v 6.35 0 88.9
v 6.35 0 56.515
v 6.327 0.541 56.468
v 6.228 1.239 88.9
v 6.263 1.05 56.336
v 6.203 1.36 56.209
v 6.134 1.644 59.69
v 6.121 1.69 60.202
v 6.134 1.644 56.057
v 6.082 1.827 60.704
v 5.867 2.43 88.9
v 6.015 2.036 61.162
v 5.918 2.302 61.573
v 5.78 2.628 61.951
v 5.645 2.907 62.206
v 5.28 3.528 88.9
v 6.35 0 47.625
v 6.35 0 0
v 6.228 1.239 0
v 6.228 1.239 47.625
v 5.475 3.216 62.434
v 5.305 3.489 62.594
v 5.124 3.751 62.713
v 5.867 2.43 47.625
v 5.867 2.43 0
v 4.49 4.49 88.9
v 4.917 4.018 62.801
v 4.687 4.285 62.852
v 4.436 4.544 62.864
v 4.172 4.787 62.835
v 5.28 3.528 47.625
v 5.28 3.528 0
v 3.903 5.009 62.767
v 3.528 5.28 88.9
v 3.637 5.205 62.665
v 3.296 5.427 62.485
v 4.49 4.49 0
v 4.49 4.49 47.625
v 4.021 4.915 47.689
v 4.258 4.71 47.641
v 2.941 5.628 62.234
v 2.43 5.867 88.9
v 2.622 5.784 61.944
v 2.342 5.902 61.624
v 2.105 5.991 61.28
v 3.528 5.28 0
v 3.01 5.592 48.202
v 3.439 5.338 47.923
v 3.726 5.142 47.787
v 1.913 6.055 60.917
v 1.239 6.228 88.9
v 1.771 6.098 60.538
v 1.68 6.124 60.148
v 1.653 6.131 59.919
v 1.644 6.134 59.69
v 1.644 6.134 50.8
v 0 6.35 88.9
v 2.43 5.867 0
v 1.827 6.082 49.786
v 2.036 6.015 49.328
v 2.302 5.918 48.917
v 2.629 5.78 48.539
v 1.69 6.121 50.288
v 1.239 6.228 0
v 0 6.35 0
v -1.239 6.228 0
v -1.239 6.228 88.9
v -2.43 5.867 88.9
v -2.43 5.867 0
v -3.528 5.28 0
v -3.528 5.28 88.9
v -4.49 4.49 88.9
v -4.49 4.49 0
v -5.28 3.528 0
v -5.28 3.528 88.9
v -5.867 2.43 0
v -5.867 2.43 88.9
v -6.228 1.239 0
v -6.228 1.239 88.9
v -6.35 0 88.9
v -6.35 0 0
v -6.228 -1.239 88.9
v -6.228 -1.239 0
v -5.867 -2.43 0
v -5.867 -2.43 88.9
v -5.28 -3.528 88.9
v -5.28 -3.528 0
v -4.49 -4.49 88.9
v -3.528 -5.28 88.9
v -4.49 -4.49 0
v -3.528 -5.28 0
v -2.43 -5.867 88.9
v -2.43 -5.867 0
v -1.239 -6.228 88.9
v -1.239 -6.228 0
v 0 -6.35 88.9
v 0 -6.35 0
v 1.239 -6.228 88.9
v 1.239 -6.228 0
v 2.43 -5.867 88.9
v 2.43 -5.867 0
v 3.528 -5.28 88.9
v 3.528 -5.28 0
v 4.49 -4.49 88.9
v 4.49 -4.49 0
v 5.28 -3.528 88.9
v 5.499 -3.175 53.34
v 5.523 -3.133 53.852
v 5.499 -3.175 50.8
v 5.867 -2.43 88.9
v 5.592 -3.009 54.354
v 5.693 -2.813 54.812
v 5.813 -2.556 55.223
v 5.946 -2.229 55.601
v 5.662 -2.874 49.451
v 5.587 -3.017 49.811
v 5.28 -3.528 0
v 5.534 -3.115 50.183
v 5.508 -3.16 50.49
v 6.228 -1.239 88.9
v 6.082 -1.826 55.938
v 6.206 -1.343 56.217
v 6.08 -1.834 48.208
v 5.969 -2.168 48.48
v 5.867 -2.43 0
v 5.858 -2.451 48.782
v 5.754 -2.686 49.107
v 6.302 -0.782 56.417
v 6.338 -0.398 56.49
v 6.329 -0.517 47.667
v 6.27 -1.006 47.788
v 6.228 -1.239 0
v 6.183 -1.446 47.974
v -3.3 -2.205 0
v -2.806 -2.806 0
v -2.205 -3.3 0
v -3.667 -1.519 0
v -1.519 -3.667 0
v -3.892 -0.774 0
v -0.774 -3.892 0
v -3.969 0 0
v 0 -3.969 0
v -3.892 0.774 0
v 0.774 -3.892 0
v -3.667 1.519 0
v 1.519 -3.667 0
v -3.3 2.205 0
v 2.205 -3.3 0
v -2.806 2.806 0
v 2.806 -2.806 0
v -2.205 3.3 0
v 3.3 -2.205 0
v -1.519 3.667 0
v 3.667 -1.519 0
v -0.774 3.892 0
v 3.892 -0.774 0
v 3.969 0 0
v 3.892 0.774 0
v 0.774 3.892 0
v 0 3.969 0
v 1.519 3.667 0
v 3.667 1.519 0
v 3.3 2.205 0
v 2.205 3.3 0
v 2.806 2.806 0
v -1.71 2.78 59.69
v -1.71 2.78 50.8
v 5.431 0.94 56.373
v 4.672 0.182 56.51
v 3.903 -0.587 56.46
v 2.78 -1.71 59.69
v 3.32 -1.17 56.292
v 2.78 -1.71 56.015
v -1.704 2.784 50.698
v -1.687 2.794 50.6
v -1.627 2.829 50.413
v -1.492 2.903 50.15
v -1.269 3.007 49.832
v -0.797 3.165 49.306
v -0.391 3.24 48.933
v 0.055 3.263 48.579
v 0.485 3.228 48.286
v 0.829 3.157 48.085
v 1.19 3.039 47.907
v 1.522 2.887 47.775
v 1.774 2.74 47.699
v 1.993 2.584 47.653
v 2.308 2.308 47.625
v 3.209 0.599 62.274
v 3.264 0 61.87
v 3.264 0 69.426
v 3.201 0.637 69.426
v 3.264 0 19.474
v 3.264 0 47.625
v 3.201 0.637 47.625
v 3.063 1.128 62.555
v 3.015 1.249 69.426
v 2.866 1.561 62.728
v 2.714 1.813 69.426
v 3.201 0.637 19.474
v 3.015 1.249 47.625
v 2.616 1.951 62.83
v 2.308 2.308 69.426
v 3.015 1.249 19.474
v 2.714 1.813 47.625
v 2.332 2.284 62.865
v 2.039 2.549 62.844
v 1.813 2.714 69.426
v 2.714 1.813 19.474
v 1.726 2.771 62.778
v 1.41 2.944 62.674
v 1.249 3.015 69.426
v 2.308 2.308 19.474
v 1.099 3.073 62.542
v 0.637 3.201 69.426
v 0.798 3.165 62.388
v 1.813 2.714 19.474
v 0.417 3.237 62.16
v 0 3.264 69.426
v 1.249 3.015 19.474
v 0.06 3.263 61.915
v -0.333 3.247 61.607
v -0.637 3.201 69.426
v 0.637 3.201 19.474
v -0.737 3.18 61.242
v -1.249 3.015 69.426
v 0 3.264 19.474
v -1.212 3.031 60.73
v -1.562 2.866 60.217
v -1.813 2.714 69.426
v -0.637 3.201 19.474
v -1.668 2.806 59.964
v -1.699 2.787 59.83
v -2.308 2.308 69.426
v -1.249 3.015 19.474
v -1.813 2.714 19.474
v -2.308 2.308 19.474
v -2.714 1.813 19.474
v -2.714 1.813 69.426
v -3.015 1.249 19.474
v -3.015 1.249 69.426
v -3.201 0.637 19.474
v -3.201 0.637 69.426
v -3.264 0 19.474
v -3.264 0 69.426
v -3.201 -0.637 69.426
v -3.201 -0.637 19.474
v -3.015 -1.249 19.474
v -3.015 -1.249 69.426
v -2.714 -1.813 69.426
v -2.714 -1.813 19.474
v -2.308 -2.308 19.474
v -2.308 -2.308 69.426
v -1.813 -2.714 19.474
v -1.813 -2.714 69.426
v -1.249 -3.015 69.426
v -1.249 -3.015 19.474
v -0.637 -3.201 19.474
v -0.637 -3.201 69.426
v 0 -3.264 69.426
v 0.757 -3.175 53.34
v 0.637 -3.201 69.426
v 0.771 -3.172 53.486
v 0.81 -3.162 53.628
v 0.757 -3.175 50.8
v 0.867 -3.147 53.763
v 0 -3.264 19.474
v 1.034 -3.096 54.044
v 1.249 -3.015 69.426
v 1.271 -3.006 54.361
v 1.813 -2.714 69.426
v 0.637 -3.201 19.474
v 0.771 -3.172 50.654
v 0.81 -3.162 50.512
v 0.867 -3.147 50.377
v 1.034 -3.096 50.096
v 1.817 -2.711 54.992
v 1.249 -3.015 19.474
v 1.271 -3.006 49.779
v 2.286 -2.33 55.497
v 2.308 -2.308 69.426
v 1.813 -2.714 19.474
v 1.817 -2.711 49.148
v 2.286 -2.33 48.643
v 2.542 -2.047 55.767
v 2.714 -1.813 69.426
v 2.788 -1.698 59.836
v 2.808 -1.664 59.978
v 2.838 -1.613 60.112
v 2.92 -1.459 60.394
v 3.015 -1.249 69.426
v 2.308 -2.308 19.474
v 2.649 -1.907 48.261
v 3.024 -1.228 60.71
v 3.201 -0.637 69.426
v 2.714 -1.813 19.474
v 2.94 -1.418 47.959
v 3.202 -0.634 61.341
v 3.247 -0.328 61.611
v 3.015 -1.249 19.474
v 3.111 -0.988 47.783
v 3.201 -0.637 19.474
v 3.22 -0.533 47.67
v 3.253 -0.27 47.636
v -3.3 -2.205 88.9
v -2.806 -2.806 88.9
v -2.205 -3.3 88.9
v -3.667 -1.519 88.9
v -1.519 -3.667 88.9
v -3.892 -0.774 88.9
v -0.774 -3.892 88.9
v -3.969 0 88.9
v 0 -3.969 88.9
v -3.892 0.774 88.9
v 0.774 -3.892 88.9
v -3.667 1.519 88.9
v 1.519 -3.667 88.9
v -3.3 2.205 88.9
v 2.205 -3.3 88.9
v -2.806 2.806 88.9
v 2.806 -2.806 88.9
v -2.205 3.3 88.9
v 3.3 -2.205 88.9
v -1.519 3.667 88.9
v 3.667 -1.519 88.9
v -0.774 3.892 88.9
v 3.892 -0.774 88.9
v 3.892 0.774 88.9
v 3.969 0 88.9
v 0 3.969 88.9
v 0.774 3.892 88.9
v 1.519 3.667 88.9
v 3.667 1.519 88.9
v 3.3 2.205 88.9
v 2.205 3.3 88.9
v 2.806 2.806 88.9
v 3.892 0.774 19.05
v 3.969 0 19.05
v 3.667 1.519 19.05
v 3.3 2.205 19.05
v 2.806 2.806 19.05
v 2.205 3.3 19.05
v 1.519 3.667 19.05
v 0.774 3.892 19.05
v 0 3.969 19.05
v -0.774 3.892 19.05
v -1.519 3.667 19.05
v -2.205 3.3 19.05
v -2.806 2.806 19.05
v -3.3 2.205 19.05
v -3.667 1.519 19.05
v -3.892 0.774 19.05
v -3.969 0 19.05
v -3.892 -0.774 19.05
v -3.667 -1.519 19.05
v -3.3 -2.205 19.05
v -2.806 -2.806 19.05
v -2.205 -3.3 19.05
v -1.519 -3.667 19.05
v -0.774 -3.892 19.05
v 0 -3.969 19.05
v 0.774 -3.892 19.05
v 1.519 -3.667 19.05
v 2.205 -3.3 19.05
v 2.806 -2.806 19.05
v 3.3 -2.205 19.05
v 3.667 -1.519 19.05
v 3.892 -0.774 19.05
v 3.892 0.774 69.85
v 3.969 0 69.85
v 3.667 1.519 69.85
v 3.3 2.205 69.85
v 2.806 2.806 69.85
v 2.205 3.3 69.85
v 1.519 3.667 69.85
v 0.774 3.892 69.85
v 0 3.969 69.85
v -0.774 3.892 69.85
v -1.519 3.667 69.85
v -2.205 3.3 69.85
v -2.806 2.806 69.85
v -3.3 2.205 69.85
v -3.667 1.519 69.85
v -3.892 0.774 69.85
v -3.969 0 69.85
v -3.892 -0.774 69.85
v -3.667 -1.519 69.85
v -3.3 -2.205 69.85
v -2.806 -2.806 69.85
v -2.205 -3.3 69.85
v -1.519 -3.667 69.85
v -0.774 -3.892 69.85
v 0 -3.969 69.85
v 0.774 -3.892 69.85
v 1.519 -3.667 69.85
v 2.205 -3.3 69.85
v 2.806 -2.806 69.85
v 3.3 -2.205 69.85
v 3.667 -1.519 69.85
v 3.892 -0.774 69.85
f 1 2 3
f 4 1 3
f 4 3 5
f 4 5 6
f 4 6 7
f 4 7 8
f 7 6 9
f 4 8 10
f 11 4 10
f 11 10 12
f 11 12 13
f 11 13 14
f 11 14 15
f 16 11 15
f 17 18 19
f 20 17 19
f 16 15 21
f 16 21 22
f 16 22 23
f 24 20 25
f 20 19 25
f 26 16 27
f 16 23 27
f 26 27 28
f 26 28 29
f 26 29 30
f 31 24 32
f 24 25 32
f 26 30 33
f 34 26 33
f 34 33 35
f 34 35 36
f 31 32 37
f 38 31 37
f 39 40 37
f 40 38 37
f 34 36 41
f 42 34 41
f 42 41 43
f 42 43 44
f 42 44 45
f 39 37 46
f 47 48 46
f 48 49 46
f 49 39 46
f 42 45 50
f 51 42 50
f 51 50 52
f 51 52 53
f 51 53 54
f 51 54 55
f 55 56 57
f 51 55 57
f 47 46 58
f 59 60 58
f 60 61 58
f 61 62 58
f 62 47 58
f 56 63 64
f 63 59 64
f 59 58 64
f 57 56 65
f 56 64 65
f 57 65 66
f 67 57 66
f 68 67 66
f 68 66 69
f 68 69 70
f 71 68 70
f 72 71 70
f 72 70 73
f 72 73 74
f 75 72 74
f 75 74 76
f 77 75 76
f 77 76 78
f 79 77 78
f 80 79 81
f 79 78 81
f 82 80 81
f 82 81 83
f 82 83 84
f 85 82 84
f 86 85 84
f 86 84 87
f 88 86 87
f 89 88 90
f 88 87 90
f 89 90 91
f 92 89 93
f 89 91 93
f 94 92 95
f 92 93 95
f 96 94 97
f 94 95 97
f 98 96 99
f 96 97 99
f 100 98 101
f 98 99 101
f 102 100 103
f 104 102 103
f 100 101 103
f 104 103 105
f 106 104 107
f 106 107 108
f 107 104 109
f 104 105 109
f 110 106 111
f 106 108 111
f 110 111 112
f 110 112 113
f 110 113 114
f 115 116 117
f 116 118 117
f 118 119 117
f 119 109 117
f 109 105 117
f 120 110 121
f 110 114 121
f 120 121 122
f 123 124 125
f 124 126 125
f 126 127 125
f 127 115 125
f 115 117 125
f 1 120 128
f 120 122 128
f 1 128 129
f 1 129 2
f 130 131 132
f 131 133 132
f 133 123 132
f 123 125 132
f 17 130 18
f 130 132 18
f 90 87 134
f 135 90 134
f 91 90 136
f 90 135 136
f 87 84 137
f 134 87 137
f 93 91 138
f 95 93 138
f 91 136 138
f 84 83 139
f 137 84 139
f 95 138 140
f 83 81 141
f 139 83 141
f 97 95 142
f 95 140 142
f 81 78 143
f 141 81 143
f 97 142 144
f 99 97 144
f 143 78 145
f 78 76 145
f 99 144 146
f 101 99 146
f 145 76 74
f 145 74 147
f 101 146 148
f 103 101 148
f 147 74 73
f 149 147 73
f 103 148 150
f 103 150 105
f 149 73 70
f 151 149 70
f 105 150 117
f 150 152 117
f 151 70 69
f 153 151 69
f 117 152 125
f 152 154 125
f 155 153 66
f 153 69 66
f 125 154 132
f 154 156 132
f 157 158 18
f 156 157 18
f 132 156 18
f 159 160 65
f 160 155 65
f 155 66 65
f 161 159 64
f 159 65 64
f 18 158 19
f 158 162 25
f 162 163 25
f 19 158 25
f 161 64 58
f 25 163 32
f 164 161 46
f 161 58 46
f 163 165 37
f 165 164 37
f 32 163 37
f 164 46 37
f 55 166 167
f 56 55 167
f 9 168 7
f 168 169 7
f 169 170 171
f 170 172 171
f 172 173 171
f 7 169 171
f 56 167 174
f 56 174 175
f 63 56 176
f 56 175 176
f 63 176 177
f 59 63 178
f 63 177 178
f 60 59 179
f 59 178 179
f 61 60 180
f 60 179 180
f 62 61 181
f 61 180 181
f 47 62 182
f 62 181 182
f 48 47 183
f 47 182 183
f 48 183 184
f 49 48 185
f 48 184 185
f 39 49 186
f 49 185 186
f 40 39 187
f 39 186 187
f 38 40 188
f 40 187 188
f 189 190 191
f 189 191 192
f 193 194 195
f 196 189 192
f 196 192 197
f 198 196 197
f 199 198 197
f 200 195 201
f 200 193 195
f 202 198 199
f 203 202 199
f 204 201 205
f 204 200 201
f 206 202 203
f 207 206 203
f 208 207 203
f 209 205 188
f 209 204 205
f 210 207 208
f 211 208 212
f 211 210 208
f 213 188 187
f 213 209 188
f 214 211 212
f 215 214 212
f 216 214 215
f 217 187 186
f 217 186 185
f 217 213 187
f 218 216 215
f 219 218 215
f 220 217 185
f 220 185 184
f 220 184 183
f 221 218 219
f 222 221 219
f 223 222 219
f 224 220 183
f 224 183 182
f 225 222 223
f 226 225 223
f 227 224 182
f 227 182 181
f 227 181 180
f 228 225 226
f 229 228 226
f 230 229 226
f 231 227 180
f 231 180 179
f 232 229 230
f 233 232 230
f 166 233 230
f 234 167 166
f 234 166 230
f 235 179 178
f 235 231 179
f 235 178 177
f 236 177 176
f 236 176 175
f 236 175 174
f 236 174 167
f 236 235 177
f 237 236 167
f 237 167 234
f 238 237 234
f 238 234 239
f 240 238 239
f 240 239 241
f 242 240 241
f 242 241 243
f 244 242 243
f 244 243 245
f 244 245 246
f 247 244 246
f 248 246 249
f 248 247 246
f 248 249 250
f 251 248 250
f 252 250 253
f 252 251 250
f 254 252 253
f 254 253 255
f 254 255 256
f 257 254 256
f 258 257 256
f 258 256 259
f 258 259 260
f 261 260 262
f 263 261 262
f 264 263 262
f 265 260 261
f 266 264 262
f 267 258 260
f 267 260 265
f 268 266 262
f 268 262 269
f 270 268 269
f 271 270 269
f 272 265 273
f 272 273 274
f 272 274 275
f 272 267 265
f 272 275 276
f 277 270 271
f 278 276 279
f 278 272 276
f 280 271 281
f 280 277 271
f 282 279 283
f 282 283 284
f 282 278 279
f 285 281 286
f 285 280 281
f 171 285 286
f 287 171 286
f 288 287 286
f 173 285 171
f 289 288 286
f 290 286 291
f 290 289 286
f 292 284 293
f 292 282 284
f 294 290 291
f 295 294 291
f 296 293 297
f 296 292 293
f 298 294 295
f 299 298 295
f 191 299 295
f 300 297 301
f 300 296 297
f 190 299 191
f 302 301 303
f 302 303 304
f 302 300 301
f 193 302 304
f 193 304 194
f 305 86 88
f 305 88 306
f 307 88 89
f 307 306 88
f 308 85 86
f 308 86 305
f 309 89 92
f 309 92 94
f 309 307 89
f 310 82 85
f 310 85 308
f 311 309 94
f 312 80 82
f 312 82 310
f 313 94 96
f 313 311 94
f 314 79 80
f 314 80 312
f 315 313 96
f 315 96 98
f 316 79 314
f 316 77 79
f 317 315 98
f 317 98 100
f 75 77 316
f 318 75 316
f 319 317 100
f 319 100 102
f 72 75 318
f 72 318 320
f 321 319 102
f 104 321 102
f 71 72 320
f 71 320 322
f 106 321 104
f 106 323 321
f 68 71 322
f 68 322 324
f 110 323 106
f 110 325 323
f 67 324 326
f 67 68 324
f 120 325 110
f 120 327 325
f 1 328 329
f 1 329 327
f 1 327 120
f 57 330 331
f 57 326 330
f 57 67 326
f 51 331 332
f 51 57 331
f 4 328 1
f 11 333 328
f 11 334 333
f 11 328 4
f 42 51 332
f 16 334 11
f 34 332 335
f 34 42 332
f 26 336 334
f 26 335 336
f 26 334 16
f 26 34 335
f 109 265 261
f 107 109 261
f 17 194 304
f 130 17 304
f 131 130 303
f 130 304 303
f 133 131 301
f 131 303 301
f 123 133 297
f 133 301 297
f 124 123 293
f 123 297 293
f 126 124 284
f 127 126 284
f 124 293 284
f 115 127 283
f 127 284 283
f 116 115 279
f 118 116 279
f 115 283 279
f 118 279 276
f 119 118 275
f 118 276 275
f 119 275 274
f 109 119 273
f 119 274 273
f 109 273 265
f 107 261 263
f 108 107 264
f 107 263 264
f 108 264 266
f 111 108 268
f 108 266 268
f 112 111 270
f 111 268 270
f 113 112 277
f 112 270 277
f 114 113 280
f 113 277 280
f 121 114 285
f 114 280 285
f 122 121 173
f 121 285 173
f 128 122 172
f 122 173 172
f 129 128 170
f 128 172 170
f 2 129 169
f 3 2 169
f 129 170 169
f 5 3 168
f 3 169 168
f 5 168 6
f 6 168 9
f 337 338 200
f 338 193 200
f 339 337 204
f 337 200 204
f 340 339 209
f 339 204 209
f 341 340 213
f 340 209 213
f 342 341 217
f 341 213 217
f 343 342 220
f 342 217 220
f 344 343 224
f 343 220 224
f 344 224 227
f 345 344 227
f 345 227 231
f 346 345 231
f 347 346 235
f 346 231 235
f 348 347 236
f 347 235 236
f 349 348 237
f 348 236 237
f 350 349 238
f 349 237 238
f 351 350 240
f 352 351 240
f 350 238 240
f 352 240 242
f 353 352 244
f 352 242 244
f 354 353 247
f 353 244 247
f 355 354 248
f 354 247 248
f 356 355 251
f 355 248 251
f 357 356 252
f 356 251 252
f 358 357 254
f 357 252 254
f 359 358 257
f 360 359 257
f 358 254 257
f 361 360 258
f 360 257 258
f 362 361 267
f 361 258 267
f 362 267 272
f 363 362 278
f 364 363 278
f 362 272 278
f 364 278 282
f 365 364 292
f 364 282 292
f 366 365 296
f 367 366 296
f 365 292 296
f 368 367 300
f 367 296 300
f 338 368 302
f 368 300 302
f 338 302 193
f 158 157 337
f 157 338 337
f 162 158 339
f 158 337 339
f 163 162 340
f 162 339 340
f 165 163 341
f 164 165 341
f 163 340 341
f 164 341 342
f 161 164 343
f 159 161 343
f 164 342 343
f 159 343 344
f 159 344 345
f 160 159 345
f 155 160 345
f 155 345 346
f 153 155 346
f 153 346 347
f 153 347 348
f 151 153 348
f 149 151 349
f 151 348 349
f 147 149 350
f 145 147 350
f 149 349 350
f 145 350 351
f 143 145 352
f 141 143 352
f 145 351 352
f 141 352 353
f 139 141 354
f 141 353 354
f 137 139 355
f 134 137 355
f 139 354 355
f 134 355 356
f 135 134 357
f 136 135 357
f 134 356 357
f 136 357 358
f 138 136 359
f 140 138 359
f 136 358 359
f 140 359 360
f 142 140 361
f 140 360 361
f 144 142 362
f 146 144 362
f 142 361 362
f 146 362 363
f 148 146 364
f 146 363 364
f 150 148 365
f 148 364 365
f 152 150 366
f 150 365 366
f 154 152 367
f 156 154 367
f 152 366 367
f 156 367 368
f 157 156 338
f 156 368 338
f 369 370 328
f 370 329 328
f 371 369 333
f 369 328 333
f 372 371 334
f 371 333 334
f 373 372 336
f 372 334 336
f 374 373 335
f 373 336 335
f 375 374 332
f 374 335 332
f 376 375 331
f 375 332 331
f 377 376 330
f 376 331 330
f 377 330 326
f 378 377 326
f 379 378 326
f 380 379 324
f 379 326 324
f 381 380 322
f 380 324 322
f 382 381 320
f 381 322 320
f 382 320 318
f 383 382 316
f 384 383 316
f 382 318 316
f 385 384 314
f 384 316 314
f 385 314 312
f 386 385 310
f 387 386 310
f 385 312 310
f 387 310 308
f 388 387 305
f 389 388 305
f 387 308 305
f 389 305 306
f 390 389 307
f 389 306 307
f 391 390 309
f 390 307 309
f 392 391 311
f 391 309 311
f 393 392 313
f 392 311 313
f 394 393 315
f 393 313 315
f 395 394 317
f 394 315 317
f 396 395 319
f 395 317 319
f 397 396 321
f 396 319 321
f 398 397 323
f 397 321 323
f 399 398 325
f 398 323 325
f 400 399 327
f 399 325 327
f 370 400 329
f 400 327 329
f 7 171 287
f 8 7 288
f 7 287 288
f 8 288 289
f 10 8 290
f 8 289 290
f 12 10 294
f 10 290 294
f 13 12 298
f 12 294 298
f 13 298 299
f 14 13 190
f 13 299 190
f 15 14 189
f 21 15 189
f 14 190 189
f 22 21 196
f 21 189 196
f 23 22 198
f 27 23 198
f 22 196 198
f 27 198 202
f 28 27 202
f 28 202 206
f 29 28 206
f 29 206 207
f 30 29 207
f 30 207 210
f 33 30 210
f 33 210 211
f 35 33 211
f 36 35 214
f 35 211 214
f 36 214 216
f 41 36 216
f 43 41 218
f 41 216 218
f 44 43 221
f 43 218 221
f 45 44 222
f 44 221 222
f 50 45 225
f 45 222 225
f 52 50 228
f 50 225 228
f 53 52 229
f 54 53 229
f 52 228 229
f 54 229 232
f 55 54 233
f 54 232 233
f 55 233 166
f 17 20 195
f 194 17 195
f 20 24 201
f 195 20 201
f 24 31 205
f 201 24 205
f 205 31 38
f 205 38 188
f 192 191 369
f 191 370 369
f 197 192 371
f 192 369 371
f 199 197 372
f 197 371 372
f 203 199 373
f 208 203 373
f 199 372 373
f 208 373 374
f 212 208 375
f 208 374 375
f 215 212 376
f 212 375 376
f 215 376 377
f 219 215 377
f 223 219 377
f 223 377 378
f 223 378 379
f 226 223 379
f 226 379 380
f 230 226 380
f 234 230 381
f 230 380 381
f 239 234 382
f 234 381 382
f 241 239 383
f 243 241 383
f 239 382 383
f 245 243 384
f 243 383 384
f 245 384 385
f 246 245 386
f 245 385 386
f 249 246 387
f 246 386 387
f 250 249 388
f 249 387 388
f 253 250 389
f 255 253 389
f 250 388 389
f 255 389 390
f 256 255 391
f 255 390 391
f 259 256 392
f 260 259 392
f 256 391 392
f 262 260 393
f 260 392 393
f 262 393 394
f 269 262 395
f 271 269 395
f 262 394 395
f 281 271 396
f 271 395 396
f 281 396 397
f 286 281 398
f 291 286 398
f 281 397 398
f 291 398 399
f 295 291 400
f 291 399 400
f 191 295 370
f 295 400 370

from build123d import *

# Parameters (mm, degrees)
SKETCH1_R           = 6.35
SKETCH1_R_2         = 3.2639
BOSS_EXTRUDE1_DEPTH = 88.9
CUT_EXTRUDE2_DEPTH  = 90.352420225
CUT_EXTRUDE3_DEPTH  = 90.352420338
SKETCH75_W          = 6.35
SKETCH75_H          = 6.35
CUT_REVOLVE1_ANGLE  = 45


# Read off the part's stored shape, not the designer's step: 3/8-16 Tapped Hole3
with BuildPart() as part:
    # Sketch1 → Boss-Extrude1 (new body)
    with BuildSketch(Plane.XY):
        Circle(SKETCH1_R)
        Circle(SKETCH1_R_2, mode=Mode.SUBTRACT)
    extrude(amount=BOSS_EXTRUDE1_DEPTH)

    # 3/8-16 Tapped Hole3 outline → 3/8-16 Tapped Hole3 (revolve, cut)
    with BuildSketch(Plane.XZ):
        Polygon((3.2639, 88.9), (3.2639, 69.426483393), (3.96875, 69.85), (3.96875, 88.9), align=None)
        Polygon((3.96875, 19.05), (3.2639, 19.473516607), (3.2639, 0), (3.96875, 0), align=None)
    revolve(axis=Axis((0, 0, 0), (0, 0, 1)), mode=Mode.SUBTRACT)

    # Sketch13 → Cut-Extrude2 (cut, through all)
    with BuildSketch(Plane(origin=(0, 0, 0), x_dir=(0, 0, -1), z_dir=(1, 0, 0))):
        with BuildLine():
            Line((-50.8, -3.175), (-53.34, -3.175))
            ThreePointArc((-53.34, -3.175), (-56.515, 0), (-53.34, 3.175))
            Line((-53.34, 3.175), (-50.8, 3.175))
            ThreePointArc((-50.8, 3.175), (-47.625, 0), (-50.8, -3.175))
        make_face()
    extrude(amount=CUT_EXTRUDE2_DEPTH, mode=Mode.SUBTRACT)

    # Sketch52 → Cut-Extrude3 (cut, through all)
    with BuildSketch(Plane(origin=(0, 0, 0), x_dir=(0.7071067811865491, -0.7071067811865461, 0), z_dir=(0.7071067811865461, 0.7071067811865491, 0))):
        with BuildLine():
            Line((3.175, -50.8), (3.175, -59.69))
            ThreePointArc((3.175, -59.69), (0, -62.865), (-3.175, -59.69))
            Line((-3.175, -59.69), (-3.175, -50.8))
            ThreePointArc((-3.175, -50.8), (0, -47.625), (3.175, -50.8))
        make_face()
    extrude(amount=CUT_EXTRUDE3_DEPTH, mode=Mode.SUBTRACT)

    # Sketch75 → Cut-Revolve1 (revolve, cut)
    with BuildSketch(Plane(origin=(0, 0, 0), x_dir=(1, 0, 0), z_dir=(0, 1, 0))):
        with Locations((3.175, -50.8)):
            Rectangle(SKETCH75_W, SKETCH75_H)
    revolve(axis=Axis((0, 0, 0), (0, 0, 1)), revolution_arc=CUT_REVOLVE1_ANGLE, mode=Mode.SUBTRACT)


solid = part.part
